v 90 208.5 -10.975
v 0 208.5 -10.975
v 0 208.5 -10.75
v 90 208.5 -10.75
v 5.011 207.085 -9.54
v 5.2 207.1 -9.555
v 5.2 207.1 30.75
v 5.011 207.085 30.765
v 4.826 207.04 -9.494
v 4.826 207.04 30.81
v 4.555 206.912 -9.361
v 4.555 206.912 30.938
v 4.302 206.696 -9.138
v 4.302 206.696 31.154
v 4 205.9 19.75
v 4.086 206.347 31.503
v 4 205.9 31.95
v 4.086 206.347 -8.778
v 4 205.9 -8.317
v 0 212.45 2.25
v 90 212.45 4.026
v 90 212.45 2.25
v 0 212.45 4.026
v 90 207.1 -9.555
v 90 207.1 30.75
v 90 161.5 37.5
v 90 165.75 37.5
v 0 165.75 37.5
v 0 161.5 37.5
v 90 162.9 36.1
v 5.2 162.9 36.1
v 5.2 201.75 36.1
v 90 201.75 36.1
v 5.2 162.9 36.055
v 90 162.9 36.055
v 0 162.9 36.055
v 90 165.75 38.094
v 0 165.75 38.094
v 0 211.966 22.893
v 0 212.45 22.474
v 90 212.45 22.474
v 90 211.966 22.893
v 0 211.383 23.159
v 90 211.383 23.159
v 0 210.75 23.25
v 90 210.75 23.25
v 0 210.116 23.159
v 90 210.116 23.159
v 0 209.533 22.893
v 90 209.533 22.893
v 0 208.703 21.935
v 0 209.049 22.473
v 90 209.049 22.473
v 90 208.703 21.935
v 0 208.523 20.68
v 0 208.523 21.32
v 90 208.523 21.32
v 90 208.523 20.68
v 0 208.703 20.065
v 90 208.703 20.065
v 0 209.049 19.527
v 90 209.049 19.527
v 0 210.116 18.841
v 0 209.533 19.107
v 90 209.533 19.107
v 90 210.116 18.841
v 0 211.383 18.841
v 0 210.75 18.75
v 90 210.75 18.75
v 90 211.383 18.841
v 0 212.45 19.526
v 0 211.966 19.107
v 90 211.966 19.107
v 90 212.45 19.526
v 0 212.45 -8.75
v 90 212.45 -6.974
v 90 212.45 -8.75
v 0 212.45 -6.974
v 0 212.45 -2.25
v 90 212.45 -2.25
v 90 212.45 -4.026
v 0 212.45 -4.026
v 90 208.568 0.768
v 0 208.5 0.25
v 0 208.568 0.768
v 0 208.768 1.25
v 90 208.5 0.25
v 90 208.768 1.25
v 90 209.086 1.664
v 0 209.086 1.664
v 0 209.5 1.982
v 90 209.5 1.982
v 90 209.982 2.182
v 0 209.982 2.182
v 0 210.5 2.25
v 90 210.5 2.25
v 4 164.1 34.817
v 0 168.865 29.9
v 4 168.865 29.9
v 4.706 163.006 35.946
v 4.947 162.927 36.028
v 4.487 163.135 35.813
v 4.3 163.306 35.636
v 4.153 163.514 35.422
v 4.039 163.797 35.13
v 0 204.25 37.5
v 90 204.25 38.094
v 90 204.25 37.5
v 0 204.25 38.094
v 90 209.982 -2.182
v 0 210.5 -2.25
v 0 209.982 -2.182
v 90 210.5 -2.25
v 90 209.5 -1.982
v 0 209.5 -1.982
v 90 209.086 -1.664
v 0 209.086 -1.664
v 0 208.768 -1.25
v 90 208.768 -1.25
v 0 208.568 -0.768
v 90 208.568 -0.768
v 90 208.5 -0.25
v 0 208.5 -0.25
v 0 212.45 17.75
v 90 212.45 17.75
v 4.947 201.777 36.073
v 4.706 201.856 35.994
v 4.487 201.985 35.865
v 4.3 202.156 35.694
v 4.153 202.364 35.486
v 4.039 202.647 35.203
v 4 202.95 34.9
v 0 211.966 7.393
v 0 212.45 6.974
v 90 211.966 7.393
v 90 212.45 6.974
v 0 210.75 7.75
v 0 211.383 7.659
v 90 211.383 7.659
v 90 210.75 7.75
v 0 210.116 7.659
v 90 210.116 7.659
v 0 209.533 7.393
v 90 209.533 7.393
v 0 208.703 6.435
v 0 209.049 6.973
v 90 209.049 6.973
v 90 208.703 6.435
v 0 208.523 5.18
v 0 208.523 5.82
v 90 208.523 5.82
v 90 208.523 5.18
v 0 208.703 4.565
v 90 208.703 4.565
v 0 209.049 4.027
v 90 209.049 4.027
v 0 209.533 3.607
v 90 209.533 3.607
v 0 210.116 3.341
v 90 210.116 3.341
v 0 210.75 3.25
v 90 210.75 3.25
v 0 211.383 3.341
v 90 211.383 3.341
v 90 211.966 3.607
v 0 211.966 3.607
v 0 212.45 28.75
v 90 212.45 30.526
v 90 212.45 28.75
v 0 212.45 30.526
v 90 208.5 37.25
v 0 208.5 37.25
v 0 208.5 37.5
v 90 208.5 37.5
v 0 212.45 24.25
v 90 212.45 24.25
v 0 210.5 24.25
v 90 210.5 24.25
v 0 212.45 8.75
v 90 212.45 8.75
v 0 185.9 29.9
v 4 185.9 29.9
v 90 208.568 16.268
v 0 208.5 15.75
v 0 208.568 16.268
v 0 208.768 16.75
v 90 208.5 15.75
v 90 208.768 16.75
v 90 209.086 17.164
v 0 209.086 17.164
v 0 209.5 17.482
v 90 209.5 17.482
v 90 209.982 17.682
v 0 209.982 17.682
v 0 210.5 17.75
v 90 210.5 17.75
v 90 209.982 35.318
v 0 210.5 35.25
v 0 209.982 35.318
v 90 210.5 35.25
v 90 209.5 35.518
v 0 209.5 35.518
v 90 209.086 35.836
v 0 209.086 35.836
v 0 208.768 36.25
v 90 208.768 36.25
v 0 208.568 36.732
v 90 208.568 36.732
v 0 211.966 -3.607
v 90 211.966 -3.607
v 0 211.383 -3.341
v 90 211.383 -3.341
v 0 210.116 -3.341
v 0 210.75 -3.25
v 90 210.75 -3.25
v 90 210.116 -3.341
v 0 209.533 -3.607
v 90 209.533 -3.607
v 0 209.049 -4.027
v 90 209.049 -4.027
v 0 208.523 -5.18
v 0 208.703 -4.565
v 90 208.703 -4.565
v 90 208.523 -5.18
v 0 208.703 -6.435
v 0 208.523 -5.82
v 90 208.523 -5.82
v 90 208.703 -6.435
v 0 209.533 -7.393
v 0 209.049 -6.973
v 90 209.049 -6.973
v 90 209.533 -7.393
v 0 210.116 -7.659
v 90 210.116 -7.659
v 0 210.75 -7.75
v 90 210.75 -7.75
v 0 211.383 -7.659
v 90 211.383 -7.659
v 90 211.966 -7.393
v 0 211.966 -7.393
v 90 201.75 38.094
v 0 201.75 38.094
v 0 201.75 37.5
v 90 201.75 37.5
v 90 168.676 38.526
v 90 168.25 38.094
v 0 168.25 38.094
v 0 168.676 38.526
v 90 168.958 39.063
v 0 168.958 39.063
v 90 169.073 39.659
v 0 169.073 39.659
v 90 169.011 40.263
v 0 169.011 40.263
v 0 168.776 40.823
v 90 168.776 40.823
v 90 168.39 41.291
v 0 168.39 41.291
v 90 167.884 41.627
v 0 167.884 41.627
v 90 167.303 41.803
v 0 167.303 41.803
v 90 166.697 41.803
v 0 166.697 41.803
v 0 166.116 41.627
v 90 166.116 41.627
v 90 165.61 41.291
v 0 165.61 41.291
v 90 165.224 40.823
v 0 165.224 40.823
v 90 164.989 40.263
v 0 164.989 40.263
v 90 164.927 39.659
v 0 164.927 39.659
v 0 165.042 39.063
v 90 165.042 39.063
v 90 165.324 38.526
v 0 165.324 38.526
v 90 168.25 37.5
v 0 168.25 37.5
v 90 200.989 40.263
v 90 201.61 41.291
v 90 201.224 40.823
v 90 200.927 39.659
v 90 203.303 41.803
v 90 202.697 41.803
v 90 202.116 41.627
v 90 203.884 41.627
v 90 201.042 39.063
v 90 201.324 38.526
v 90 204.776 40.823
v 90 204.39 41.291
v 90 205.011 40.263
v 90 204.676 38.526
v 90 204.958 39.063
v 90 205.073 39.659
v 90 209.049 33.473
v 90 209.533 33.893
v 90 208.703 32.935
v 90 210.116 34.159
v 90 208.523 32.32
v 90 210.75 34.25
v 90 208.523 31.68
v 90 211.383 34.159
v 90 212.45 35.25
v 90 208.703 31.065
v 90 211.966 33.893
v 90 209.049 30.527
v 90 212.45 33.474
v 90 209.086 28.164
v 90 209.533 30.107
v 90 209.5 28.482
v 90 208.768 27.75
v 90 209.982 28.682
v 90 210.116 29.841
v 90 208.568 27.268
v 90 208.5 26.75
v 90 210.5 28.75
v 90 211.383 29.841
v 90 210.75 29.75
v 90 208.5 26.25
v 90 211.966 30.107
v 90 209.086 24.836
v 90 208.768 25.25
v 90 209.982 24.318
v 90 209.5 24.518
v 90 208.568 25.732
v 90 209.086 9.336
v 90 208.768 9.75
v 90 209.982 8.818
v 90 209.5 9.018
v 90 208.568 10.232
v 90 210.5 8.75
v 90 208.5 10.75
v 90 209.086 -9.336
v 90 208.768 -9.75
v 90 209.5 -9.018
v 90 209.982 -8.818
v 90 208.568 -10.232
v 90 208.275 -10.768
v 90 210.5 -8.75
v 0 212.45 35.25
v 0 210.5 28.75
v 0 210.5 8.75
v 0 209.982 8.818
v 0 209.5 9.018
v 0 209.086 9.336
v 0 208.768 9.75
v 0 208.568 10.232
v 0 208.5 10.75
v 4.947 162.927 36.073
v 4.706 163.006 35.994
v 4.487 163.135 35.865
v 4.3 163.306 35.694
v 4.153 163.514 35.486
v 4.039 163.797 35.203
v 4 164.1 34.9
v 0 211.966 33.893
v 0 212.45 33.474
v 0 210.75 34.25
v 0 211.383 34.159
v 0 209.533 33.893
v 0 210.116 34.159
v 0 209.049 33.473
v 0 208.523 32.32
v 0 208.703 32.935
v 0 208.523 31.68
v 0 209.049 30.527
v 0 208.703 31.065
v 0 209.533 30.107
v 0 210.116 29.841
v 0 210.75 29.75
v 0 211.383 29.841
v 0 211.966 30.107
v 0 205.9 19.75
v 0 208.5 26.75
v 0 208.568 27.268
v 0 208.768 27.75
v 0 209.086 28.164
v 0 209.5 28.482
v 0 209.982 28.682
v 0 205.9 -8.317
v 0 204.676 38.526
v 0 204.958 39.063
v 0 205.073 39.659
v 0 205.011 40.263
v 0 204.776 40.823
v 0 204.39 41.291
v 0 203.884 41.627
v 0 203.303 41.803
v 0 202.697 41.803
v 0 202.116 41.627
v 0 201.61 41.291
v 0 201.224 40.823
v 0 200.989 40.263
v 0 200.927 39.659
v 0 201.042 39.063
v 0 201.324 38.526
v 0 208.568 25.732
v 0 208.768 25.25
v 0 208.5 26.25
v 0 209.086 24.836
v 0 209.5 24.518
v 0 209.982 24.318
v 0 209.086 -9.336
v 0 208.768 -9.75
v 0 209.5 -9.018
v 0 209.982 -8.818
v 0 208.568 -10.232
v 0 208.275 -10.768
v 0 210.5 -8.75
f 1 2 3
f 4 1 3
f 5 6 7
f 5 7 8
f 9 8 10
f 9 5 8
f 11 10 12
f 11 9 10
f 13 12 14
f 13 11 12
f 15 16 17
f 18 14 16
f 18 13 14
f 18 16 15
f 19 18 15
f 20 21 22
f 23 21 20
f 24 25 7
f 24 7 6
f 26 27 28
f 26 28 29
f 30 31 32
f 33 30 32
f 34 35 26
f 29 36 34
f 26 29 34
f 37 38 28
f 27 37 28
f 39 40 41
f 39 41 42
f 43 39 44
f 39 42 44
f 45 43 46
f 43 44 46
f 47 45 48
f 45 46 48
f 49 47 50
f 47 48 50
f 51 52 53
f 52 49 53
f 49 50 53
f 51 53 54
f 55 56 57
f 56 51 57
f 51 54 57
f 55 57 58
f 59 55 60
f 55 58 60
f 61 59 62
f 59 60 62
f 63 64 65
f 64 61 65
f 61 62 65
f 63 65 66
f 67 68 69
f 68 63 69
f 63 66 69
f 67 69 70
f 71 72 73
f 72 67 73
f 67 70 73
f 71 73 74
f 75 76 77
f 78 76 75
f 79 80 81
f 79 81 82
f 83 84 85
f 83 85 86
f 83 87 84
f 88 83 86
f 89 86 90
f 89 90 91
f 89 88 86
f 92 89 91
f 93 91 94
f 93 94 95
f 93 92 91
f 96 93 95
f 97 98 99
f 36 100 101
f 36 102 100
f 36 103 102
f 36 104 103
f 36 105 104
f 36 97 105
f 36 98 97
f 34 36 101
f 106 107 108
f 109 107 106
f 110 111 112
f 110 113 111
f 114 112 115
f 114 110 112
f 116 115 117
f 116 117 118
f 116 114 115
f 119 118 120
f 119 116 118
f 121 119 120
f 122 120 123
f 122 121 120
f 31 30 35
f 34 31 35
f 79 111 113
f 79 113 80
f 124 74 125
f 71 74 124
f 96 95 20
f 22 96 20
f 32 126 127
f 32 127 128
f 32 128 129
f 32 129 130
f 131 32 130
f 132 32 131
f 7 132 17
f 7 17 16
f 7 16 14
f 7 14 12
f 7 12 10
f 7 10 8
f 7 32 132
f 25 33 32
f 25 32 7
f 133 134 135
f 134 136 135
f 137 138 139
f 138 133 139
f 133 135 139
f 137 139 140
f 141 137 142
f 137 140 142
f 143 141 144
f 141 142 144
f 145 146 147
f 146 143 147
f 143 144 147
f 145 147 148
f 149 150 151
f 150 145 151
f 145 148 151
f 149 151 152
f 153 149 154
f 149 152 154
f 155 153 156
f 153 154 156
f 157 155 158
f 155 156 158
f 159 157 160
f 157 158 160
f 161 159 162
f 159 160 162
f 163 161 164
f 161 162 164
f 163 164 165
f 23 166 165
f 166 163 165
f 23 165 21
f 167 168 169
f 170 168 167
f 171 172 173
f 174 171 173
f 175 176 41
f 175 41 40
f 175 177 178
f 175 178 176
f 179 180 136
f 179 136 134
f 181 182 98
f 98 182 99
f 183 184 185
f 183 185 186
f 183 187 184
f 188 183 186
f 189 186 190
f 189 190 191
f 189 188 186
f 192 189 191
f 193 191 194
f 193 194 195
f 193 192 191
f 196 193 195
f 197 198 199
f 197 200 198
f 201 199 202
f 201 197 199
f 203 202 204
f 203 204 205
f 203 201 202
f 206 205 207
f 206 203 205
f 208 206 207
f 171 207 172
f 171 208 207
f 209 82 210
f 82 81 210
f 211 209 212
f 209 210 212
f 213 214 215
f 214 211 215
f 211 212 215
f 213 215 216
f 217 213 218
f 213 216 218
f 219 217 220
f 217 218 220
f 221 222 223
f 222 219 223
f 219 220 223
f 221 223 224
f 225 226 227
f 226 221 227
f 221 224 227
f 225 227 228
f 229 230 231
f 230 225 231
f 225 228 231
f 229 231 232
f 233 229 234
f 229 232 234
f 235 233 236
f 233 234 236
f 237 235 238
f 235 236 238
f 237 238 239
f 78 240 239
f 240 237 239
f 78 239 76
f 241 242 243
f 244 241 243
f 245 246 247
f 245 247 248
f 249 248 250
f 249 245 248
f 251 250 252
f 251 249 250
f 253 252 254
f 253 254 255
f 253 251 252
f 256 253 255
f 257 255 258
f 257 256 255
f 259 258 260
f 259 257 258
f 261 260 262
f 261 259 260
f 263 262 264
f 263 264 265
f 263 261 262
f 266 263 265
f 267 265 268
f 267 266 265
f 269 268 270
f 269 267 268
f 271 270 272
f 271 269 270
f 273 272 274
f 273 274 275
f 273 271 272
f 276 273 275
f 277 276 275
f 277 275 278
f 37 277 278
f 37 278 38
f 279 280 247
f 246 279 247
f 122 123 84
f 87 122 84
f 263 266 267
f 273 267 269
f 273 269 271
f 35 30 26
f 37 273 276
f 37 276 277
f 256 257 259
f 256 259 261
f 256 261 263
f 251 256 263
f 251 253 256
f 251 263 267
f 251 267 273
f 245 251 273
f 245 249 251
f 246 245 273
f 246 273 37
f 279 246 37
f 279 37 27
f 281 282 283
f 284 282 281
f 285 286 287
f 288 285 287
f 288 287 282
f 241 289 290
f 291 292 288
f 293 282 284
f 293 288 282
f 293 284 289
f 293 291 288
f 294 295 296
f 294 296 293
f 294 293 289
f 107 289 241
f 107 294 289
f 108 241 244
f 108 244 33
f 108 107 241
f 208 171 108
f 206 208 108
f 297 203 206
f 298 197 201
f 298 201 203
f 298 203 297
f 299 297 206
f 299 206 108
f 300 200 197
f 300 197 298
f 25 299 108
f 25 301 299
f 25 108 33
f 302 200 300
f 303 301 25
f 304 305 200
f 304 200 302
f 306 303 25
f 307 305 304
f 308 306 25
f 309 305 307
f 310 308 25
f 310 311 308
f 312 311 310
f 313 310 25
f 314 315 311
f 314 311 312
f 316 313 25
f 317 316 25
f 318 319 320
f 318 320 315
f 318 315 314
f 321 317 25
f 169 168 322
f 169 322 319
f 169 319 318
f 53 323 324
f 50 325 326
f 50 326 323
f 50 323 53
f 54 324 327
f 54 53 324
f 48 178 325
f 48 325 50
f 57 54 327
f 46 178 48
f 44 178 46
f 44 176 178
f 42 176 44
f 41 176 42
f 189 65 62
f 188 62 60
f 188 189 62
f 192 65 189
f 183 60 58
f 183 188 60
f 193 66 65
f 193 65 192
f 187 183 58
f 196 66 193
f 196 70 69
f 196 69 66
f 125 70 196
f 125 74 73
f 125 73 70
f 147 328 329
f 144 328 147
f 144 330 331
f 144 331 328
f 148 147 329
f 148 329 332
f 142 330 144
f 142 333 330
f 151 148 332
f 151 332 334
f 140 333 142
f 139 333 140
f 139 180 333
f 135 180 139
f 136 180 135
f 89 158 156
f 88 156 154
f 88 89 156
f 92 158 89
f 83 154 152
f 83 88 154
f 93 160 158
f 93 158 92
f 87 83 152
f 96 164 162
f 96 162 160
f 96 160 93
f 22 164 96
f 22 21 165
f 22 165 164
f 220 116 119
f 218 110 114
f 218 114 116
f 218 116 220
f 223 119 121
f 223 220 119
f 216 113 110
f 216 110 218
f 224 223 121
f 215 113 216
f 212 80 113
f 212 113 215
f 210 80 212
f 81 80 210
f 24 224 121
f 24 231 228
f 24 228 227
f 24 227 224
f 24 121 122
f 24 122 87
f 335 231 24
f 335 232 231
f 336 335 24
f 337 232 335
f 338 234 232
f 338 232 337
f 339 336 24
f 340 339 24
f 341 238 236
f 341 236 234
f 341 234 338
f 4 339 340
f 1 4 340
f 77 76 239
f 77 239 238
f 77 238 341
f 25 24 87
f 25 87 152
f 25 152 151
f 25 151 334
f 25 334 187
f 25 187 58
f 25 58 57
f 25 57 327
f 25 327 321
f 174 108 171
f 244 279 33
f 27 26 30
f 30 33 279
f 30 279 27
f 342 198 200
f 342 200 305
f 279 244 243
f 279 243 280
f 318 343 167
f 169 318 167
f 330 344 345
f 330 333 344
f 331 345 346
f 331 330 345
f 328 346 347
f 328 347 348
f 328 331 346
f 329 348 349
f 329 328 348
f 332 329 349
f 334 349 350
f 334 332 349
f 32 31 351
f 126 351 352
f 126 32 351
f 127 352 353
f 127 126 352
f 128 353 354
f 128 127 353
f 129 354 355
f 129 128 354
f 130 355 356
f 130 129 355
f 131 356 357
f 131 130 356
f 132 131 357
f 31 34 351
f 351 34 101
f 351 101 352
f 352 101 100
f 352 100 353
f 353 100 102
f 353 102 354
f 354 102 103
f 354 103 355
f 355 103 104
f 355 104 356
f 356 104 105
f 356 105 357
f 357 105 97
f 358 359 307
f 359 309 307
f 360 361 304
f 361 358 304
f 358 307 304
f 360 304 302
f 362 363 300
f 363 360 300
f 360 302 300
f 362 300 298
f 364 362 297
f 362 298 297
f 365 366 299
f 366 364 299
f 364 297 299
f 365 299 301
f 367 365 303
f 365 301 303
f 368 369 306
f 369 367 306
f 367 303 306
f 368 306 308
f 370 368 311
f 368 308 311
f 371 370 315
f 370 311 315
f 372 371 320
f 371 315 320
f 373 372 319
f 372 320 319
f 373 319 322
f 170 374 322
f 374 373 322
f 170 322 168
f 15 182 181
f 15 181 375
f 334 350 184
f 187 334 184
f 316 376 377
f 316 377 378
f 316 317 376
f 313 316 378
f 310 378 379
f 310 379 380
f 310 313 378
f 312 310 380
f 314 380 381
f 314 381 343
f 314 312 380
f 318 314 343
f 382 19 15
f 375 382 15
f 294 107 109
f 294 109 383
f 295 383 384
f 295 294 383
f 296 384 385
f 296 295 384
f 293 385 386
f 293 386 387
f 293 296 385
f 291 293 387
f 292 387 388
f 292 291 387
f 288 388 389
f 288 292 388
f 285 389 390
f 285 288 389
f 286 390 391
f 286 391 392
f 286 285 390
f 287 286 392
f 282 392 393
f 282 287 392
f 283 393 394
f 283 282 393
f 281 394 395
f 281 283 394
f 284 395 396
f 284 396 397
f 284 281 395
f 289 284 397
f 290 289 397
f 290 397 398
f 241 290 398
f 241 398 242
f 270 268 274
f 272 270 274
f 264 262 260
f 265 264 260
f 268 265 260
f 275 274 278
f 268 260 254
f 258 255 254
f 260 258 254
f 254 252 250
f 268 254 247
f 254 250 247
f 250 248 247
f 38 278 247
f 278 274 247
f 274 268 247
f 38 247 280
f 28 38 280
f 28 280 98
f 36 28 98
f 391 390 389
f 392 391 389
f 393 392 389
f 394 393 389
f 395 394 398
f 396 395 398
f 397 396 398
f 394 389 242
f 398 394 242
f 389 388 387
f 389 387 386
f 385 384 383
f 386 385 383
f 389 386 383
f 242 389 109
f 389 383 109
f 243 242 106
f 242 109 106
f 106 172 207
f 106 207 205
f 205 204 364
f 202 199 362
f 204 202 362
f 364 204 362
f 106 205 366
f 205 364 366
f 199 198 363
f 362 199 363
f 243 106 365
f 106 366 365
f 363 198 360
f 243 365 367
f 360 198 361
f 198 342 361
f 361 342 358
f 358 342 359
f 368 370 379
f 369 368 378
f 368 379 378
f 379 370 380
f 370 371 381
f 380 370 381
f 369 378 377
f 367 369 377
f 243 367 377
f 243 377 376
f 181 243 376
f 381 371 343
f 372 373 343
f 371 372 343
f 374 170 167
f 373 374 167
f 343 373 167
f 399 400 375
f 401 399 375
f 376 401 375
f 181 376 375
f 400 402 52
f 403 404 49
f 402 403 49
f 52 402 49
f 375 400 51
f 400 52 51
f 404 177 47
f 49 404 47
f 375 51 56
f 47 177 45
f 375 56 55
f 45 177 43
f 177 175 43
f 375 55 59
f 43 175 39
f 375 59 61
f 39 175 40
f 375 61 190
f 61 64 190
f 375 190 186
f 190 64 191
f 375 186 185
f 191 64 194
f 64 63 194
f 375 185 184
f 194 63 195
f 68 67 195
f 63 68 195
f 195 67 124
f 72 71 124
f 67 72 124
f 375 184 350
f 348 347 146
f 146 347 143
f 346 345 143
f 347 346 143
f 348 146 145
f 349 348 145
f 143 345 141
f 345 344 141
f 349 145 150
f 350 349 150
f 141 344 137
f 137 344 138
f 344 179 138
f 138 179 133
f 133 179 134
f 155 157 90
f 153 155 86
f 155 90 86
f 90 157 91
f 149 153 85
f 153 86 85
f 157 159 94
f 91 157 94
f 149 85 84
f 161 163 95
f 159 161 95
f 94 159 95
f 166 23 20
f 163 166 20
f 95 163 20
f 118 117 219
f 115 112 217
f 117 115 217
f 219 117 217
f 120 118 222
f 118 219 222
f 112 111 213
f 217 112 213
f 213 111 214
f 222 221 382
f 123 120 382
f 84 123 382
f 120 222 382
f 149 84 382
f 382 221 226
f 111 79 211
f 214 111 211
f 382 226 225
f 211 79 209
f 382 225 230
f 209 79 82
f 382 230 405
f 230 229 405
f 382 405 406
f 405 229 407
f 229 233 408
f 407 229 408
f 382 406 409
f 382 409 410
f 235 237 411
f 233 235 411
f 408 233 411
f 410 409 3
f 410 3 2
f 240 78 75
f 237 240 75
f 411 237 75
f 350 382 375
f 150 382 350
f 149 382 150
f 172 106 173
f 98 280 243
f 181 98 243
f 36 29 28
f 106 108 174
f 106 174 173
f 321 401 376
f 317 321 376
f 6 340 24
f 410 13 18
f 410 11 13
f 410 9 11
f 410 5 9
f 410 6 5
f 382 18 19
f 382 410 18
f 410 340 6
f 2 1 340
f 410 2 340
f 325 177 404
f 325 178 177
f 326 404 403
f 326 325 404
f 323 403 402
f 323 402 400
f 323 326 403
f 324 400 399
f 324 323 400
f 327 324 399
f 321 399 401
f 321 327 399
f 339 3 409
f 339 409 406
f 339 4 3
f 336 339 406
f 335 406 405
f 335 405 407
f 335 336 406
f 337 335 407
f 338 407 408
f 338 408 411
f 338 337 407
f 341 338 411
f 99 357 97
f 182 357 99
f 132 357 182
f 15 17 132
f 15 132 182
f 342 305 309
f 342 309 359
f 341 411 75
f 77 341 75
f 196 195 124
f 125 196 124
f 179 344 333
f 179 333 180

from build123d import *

# Parameters (mm, degrees)
EXTRUDE_1_DEPTH             = 90
SKETCH_2_W                  = 90
SKETCH_2_H                  = 42.75
EXTRUDE_2_DEPTH             = 8.2
SKETCH_3_W                  = 90
SKETCH_3_H                  = 52.45
EXTRUDE_3_DEPTH             = 8.2
SKETCH_4_W                  = 3.95
SKETCH_4_H                  = 2.25
CUT_EXTRUDE_1_DEPTH         = 235.487383722
SKETCH_5_W                  = 3.95
SKETCH_5_H                  = 29.5
CUT_EXTRUDE_2_DEPTH         = 235.487383722
SKETCH_6_W                  = 3.95
SKETCH_6_H                  = 6.2
CUT_EXTRUDE_3_DEPTH         = 235.487383722
SKETCH_7_W                  = 2.25
SKETCH_7_H                  = 3.95
CUT_EXTRUDE_4_DEPTH         = 235.487383722
SKETCH_8_W                  = 4.5
SKETCH_8_H                  = 3.95
CUT_EXTRUDE_5_DEPTH         = 235.487383722
SKETCH_9_W                  = 9
SKETCH_9_H                  = 3.95
CUT_EXTRUDE_6_DEPTH         = 235.487383722
SKETCH_10_W                 = 4.5
SKETCH_10_H                 = 3.95
CUT_EXTRUDE_7_DEPTH         = 235.487383722
SKETCH_11_W                 = 2.25
SKETCH_11_H                 = 3.95
CUT_EXTRUDE_8_DEPTH         = 235.487383722
SKETCH_12_W                 = 45.7
SKETCH_12_H                 = 44.2
CUT_EXTRUDE_9_DEPTH         = 86
HOLE_WIZARD_2_5_2_5_1_D     = 2.5
HOLE_WIZARD_4_5_4_5_1_D     = 4.5
HOLE_WIZARD_8_3_8_3_1_D     = 8.3
HOLE_WIZARD_8_3_8_3_1_DEPTH = 3.2
SKETCH_19_R                 = 1.67252853
SKETCH_19_R_2               = 1.459159852
SKETCH_19_R_3               = 1.459908976
SKETCH_19_R_4               = 1.592821911
SKETCH_19_R_5               = 1.532216665
SKETCH_19_R_6               = 1.596138091
EXTRUDE_4_DEPTH             = 90
CUT_EXTRUDE_START           = -90
SKETCH_20_R                 = 4.15
CUT_EXTRUDE_10_DEPTH        = 90
FILLET_1_R                  = 2
FILLET_2_R                  = 2
FILLET_3_R                  = 2
FILLET_4_R                  = 2
FILLET_5_R                  = 2
FILLET_6_R                  = 2
FILLET_7_R                  = 2
FILLET_8_R                  = 2
FILLET_9_R                  = 2
FILLET_10_R                 = 2
FILLET_11_R                 = 2
FILLET_12_R                 = 2
FILLET_13_R                 = 1.2
CUT_EXTRUDE_12_DEPTH        = 150
CUT_EXTRUDE_13_DEPTH        = 39
EXTRUDE_5_DEPTH             = 4
EXTRUDE_6_DEPTH             = 88


with BuildPart() as part:
    # Эскиз1 → Бобышка-Вытянуть1 (new body)
    with BuildSketch(Plane(origin=(90, 0, 0), x_dir=(0, 0, -1), z_dir=(1, 0, 0))):
        with BuildLine():
            Line((6.75, 160.906238208), (6.75, 204.25))
            Line((6.75, 204.25), (-38.093761792, 204.25))
            ThreePointArc((-38.093761792, 204.25), (-41.825, 203), (-38.093761792, 201.75))
            Line((-38.093761792, 201.75), (-37.5, 201.75))
            Line((-37.5, 201.75), (-37.5, 168.25))
            Line((-37.5, 168.25), (-38.093761792, 168.25))
            ThreePointArc((-38.093761792, 168.25), (-41.825, 167), (-38.093761792, 165.75))
            Line((-38.093761792, 165.75), (-37.5, 165.75))
            Line((-37.5, 165.75), (-37.5, 161.5))
            Line((-37.5, 161.5), (-33.25, 161.5))
            Line((-33.25, 161.5), (-33.25, 160.906238208))
            ThreePointArc((-33.25, 160.906238208), (-32, 157.175), (-30.75, 160.906238208))
            Line((-30.75, 160.906238208), (-30.75, 161.5))
            Line((-30.75, 161.5), (-22.25, 161.5))
            Line((-22.25, 161.5), (-22.25, 160.906238208))
            ThreePointArc((-22.25, 160.906238208), (-21, 157.175), (-19.75, 160.906238208))
            Line((-19.75, 160.906238208), (-19.75, 161.5))
            Line((-19.75, 161.5), (-6.75, 161.5))
            Line((-6.75, 161.5), (-6.75, 160.906238208))
            ThreePointArc((-6.75, 160.906238208), (-5.5, 157.175), (-4.25, 160.906238208))
            Line((-4.25, 160.906238208), (-4.25, 161.5))
            Line((-4.25, 161.5), (4.25, 161.5))
            Line((4.25, 161.5), (4.25, 160.906238208))
            ThreePointArc((4.25, 160.906238208), (5.5, 157.175), (6.75, 160.906238208))
        make_face()
    extrude(amount=-EXTRUDE_1_DEPTH)

    # Эскиз2 → Бобышка-Вытянуть2 (add)
    with BuildSketch(Plane(origin=(0, 0, -6.75), x_dir=(-1, 0, 0), z_dir=(0, 0, -1))):
        with Locations((-45, 182.875)):
            Rectangle(SKETCH_2_W, SKETCH_2_H)
    extrude(amount=EXTRUDE_2_DEPTH)

    # Эскиз3 → Бобышка-Вытянуть3 (add)
    with BuildSketch(Plane(origin=(0, 204.25, 0), x_dir=(-1, 0, 0), z_dir=(0, 1, 0))):
        with Locations((-45, 11.275)):
            Rectangle(SKETCH_3_W, SKETCH_3_H)
    extrude(amount=EXTRUDE_3_DEPTH)

    # Эскиз4 → Вырез-Вытянуть1 (cut, through all)
    with BuildSketch(Plane.ZY):
        with Locations((-12.975, 162.625)):
            Rectangle(SKETCH_4_W, SKETCH_4_H)
    extrude(amount=-CUT_EXTRUDE_1_DEPTH, mode=Mode.SUBTRACT)

    # Эскиз5 → Вырез-Вытянуть2 (cut, through all)
    with BuildSketch(Plane.ZY):
        with Locations((-12.975, 185)):
            Rectangle(SKETCH_5_W, SKETCH_5_H)
    extrude(amount=-CUT_EXTRUDE_2_DEPTH, mode=Mode.SUBTRACT)

    # Эскиз6 → Вырез-Вытянуть3 (cut, through all)
    with BuildSketch(Plane.ZY):
        with Locations((-12.975, 209.35)):
            Rectangle(SKETCH_6_W, SKETCH_6_H)
    extrude(amount=-CUT_EXTRUDE_3_DEPTH, mode=Mode.SUBTRACT)

    # Эскиз7 → Вырез-Вытянуть4 (cut, through all)
    with BuildSketch(Plane.ZY):
        with Locations((-9.875, 210.475)):
            Rectangle(SKETCH_7_W, SKETCH_7_H)
    extrude(amount=-CUT_EXTRUDE_4_DEPTH, mode=Mode.SUBTRACT)

    # Эскиз8 → Вырез-Вытянуть5 (cut, through all)
    with BuildSketch(Plane.ZY):
        with Locations((0, 210.475)):
            Rectangle(SKETCH_8_W, SKETCH_8_H)
    extrude(amount=-CUT_EXTRUDE_5_DEPTH, mode=Mode.SUBTRACT)

    # Эскиз9 → Вырез-Вытянуть6 (cut, through all)
    with BuildSketch(Plane.ZY):
        with Locations((13.25, 210.475)):
            Rectangle(SKETCH_9_W, SKETCH_9_H)
    extrude(amount=-CUT_EXTRUDE_6_DEPTH, mode=Mode.SUBTRACT)

    # Эскиз10 → Вырез-Вытянуть7 (cut, through all)
    with BuildSketch(Plane.ZY):
        with Locations((26.5, 210.475)):
            Rectangle(SKETCH_10_W, SKETCH_10_H)
    extrude(amount=-CUT_EXTRUDE_7_DEPTH, mode=Mode.SUBTRACT)

    # Эскиз11 → Вырез-Вытянуть8 (cut, through all)
    with BuildSketch(Plane.ZY):
        with Locations((36.375, 210.475)):
            Rectangle(SKETCH_11_W, SKETCH_11_H)
    extrude(amount=-CUT_EXTRUDE_8_DEPTH, mode=Mode.SUBTRACT)

    # Эскиз12 → Вырез-Вытянуть9 (cut)
    with BuildSketch(Plane(origin=(90, 0, 0), x_dir=(0, 0, -1), z_dir=(1, 0, 0))):
        with Locations((-13.25, 185)):
            Rectangle(SKETCH_12_W, SKETCH_12_H)
    extrude(amount=-CUT_EXTRUDE_9_DEPTH, mode=Mode.SUBTRACT)

    # Диаметр отверстия Ø2.5 (2.5)1 (through all)
    with Locations(Plane(origin=(90, 0, 0), x_dir=(0, 0, -1), z_dir=(1, 0, 0))):
        with Locations((5.5, 159.25), (-21, 159.25), (-5.5, 159.25), (-32, 159.25), (-39.75, 167), (-39.75, 203)):
            Hole(HOLE_WIZARD_2_5_2_5_1_D / 2)

    # Диаметр отверстия Ø4.5 (4.5)1 (through all)
    with Locations(Plane.ZY):
        with Locations((-13.25, 167), (-13.25, 203), (-5.5, 210.75), (5.5, 210.75), (21, 210.75), (32, 210.75)):
            Hole(HOLE_WIZARD_4_5_4_5_1_D / 2)

    # Диаметр отверстия Ø8.3 (8.3)1
    with Locations(Plane.ZY):
        with Locations((13.25, 185)):
            Hole(HOLE_WIZARD_8_3_8_3_1_D / 2, depth=HOLE_WIZARD_8_3_8_3_1_DEPTH)

    # Эскиз19 → Бобышка-Вытянуть4 (add)
    with BuildSketch(Plane(origin=(90, 0, 0), x_dir=(0, 0, -1), z_dir=(1, 0, 0))):
        with Locations((-39.75, 203)):
            Circle(SKETCH_19_R)
        with Locations((-39.75, 167)):
            Circle(SKETCH_19_R_2)
        with Locations((-32, 159.25)):
            Circle(SKETCH_19_R_3)
        with Locations((-21, 159.25)):
            Circle(SKETCH_19_R_4)
        with Locations((-5.5, 159.25)):
            Circle(SKETCH_19_R_5)
        with Locations((5.5, 159.25)):
            Circle(SKETCH_19_R_6)
    extrude(amount=-EXTRUDE_4_DEPTH)

    # Эскиз20 → Вырез-Вытянуть10 (cut)
    with BuildSketch(Plane.ZY.offset(CUT_EXTRUDE_START)):
        with Locations((13.25, 185)):
            Circle(SKETCH_20_R)
    extrude(amount=CUT_EXTRUDE_10_DEPTH, mode=Mode.SUBTRACT)

    # Скругление1
    fillet_1_edges = [part.edges().sort_by_distance(p)[0] for p in [
        (45, 208.5, -8.75),
    ]]
    fillet(fillet_1_edges, radius=FILLET_1_R)

    # Скругление2
    fillet_2_edges = [part.edges().sort_by_distance(p)[0] for p in [
        (45, 163.75, -11),
    ]]
    fillet(fillet_2_edges, radius=FILLET_2_R)

    # Скругление3
    fillet_3_edges = [part.edges().sort_by_distance(p)[0] for p in [
        (45, 170.25, -11),
    ]]
    fillet(fillet_3_edges, radius=FILLET_3_R)

    # Скругление4
    fillet_4_edges = [part.edges().sort_by_distance(p)[0] for p in [
        (45, 199.75, -11),
    ]]
    fillet(fillet_4_edges, radius=FILLET_4_R)

    # Скругление5
    fillet_5_edges = [part.edges().sort_by_distance(p)[0] for p in [
        (45, 206.25, -11),
    ]]
    fillet(fillet_5_edges, radius=FILLET_5_R)

    # Скругление6
    fillet_6_edges = [part.edges().sort_by_distance(p)[0] for p in [
        (45, 208.5, -2.25),
    ]]
    fillet(fillet_6_edges, radius=FILLET_6_R)

    # Скругление7
    fillet_7_edges = [part.edges().sort_by_distance(p)[0] for p in [
        (45, 208.5, 2.25),
    ]]
    fillet(fillet_7_edges, radius=FILLET_7_R)

    # Скругление8
    fillet_8_edges = [part.edges().sort_by_distance(p)[0] for p in [
        (45, 208.5, 8.75),
    ]]
    fillet(fillet_8_edges, radius=FILLET_8_R)

    # Скругление9
    fillet_9_edges = [part.edges().sort_by_distance(p)[0] for p in [
        (45, 208.5, 17.75),
    ]]
    fillet(fillet_9_edges, radius=FILLET_9_R)

    # Скругление10
    fillet_10_edges = [part.edges().sort_by_distance(p)[0] for p in [
        (45, 208.5, 24.25),
    ]]
    fillet(fillet_10_edges, radius=FILLET_10_R)

    # Скругление11
    fillet_11_edges = [part.edges().sort_by_distance(p)[0] for p in [
        (45, 208.5, 28.75),
    ]]
    fillet(fillet_11_edges, radius=FILLET_11_R)

    # Скругление12
    fillet_12_edges = [part.edges().sort_by_distance(p)[0] for p in [
        (45, 208.5, 35.25),
    ]]
    fillet(fillet_12_edges, radius=FILLET_12_R)

    # Скругление13
    fillet_13_edges = [part.edges().sort_by_distance(p)[0] for p in [
        (4, 185, -9.6),
        (4, 162.9, 13.25),
        (4, 185, 36.1),
        (4, 207.1, 13.25),
    ]]
    fillet(fillet_13_edges, radius=FILLET_13_R)

    # Эскиз21 → Вырез-Вытянуть12 (cut)
    with BuildSketch(Plane(origin=(90, 0, 0), x_dir=(0, 0, -1), z_dir=(1, 0, 0))):
        Polygon((30.296200346, 229.506902043), (10.767748913, 208.274931936), (-37.5, 161.5), (-46.097592317, 153.168312601), (30.296200346, 153.168312601), align=None)
    extrude(amount=-CUT_EXTRUDE_12_DEPTH, mode=Mode.SUBTRACT)

    # Эскиз22 → Вырез-Вытянуть13 (cut)
    with BuildSketch(Plane(origin=(4, 0, 0), x_dir=(0, 0, -1), z_dir=(1, 0, 0))):
        with BuildLine():
            Line((-29.9, 205.9), (-29.9, 168.864948454))
            Line((-29.9, 168.864948454), (-16.230217065, 182.111954597))
            ThreePointArc((-16.230217065, 182.111954597), (-16.138045403, 187.980217065), (-10.269782935, 187.888045403))
            Line((-10.269782935, 187.888045403), (8.317021277, 205.9))
            Line((8.317021277, 205.9), (-29.9, 205.9))
        make_face()
    extrude(amount=-CUT_EXTRUDE_13_DEPTH, mode=Mode.SUBTRACT)

    # Эскиз23 → Бобышка-Вытянуть5 (add)
    with BuildSketch(Plane(origin=(4, 0, 0), x_dir=(0, 0, -1), z_dir=(1, 0, 0))):
        Polygon((-29.9, 205.9), (-29.9, 185.9), (-19.75, 205.9), align=None)
    extrude(amount=-EXTRUDE_5_DEPTH)

    # Эскиз24 → Бобышка-Вытянуть6 (add)
    with BuildSketch(Plane(origin=(90, 0, 0), x_dir=(0, 0, -1), z_dir=(1, 0, 0))):
        Polygon((-36.1, 207.1), (-36.1, 201.75), (-30.75, 207.1), align=None)
    extrude(amount=-EXTRUDE_6_DEPTH)


solid = part.part
